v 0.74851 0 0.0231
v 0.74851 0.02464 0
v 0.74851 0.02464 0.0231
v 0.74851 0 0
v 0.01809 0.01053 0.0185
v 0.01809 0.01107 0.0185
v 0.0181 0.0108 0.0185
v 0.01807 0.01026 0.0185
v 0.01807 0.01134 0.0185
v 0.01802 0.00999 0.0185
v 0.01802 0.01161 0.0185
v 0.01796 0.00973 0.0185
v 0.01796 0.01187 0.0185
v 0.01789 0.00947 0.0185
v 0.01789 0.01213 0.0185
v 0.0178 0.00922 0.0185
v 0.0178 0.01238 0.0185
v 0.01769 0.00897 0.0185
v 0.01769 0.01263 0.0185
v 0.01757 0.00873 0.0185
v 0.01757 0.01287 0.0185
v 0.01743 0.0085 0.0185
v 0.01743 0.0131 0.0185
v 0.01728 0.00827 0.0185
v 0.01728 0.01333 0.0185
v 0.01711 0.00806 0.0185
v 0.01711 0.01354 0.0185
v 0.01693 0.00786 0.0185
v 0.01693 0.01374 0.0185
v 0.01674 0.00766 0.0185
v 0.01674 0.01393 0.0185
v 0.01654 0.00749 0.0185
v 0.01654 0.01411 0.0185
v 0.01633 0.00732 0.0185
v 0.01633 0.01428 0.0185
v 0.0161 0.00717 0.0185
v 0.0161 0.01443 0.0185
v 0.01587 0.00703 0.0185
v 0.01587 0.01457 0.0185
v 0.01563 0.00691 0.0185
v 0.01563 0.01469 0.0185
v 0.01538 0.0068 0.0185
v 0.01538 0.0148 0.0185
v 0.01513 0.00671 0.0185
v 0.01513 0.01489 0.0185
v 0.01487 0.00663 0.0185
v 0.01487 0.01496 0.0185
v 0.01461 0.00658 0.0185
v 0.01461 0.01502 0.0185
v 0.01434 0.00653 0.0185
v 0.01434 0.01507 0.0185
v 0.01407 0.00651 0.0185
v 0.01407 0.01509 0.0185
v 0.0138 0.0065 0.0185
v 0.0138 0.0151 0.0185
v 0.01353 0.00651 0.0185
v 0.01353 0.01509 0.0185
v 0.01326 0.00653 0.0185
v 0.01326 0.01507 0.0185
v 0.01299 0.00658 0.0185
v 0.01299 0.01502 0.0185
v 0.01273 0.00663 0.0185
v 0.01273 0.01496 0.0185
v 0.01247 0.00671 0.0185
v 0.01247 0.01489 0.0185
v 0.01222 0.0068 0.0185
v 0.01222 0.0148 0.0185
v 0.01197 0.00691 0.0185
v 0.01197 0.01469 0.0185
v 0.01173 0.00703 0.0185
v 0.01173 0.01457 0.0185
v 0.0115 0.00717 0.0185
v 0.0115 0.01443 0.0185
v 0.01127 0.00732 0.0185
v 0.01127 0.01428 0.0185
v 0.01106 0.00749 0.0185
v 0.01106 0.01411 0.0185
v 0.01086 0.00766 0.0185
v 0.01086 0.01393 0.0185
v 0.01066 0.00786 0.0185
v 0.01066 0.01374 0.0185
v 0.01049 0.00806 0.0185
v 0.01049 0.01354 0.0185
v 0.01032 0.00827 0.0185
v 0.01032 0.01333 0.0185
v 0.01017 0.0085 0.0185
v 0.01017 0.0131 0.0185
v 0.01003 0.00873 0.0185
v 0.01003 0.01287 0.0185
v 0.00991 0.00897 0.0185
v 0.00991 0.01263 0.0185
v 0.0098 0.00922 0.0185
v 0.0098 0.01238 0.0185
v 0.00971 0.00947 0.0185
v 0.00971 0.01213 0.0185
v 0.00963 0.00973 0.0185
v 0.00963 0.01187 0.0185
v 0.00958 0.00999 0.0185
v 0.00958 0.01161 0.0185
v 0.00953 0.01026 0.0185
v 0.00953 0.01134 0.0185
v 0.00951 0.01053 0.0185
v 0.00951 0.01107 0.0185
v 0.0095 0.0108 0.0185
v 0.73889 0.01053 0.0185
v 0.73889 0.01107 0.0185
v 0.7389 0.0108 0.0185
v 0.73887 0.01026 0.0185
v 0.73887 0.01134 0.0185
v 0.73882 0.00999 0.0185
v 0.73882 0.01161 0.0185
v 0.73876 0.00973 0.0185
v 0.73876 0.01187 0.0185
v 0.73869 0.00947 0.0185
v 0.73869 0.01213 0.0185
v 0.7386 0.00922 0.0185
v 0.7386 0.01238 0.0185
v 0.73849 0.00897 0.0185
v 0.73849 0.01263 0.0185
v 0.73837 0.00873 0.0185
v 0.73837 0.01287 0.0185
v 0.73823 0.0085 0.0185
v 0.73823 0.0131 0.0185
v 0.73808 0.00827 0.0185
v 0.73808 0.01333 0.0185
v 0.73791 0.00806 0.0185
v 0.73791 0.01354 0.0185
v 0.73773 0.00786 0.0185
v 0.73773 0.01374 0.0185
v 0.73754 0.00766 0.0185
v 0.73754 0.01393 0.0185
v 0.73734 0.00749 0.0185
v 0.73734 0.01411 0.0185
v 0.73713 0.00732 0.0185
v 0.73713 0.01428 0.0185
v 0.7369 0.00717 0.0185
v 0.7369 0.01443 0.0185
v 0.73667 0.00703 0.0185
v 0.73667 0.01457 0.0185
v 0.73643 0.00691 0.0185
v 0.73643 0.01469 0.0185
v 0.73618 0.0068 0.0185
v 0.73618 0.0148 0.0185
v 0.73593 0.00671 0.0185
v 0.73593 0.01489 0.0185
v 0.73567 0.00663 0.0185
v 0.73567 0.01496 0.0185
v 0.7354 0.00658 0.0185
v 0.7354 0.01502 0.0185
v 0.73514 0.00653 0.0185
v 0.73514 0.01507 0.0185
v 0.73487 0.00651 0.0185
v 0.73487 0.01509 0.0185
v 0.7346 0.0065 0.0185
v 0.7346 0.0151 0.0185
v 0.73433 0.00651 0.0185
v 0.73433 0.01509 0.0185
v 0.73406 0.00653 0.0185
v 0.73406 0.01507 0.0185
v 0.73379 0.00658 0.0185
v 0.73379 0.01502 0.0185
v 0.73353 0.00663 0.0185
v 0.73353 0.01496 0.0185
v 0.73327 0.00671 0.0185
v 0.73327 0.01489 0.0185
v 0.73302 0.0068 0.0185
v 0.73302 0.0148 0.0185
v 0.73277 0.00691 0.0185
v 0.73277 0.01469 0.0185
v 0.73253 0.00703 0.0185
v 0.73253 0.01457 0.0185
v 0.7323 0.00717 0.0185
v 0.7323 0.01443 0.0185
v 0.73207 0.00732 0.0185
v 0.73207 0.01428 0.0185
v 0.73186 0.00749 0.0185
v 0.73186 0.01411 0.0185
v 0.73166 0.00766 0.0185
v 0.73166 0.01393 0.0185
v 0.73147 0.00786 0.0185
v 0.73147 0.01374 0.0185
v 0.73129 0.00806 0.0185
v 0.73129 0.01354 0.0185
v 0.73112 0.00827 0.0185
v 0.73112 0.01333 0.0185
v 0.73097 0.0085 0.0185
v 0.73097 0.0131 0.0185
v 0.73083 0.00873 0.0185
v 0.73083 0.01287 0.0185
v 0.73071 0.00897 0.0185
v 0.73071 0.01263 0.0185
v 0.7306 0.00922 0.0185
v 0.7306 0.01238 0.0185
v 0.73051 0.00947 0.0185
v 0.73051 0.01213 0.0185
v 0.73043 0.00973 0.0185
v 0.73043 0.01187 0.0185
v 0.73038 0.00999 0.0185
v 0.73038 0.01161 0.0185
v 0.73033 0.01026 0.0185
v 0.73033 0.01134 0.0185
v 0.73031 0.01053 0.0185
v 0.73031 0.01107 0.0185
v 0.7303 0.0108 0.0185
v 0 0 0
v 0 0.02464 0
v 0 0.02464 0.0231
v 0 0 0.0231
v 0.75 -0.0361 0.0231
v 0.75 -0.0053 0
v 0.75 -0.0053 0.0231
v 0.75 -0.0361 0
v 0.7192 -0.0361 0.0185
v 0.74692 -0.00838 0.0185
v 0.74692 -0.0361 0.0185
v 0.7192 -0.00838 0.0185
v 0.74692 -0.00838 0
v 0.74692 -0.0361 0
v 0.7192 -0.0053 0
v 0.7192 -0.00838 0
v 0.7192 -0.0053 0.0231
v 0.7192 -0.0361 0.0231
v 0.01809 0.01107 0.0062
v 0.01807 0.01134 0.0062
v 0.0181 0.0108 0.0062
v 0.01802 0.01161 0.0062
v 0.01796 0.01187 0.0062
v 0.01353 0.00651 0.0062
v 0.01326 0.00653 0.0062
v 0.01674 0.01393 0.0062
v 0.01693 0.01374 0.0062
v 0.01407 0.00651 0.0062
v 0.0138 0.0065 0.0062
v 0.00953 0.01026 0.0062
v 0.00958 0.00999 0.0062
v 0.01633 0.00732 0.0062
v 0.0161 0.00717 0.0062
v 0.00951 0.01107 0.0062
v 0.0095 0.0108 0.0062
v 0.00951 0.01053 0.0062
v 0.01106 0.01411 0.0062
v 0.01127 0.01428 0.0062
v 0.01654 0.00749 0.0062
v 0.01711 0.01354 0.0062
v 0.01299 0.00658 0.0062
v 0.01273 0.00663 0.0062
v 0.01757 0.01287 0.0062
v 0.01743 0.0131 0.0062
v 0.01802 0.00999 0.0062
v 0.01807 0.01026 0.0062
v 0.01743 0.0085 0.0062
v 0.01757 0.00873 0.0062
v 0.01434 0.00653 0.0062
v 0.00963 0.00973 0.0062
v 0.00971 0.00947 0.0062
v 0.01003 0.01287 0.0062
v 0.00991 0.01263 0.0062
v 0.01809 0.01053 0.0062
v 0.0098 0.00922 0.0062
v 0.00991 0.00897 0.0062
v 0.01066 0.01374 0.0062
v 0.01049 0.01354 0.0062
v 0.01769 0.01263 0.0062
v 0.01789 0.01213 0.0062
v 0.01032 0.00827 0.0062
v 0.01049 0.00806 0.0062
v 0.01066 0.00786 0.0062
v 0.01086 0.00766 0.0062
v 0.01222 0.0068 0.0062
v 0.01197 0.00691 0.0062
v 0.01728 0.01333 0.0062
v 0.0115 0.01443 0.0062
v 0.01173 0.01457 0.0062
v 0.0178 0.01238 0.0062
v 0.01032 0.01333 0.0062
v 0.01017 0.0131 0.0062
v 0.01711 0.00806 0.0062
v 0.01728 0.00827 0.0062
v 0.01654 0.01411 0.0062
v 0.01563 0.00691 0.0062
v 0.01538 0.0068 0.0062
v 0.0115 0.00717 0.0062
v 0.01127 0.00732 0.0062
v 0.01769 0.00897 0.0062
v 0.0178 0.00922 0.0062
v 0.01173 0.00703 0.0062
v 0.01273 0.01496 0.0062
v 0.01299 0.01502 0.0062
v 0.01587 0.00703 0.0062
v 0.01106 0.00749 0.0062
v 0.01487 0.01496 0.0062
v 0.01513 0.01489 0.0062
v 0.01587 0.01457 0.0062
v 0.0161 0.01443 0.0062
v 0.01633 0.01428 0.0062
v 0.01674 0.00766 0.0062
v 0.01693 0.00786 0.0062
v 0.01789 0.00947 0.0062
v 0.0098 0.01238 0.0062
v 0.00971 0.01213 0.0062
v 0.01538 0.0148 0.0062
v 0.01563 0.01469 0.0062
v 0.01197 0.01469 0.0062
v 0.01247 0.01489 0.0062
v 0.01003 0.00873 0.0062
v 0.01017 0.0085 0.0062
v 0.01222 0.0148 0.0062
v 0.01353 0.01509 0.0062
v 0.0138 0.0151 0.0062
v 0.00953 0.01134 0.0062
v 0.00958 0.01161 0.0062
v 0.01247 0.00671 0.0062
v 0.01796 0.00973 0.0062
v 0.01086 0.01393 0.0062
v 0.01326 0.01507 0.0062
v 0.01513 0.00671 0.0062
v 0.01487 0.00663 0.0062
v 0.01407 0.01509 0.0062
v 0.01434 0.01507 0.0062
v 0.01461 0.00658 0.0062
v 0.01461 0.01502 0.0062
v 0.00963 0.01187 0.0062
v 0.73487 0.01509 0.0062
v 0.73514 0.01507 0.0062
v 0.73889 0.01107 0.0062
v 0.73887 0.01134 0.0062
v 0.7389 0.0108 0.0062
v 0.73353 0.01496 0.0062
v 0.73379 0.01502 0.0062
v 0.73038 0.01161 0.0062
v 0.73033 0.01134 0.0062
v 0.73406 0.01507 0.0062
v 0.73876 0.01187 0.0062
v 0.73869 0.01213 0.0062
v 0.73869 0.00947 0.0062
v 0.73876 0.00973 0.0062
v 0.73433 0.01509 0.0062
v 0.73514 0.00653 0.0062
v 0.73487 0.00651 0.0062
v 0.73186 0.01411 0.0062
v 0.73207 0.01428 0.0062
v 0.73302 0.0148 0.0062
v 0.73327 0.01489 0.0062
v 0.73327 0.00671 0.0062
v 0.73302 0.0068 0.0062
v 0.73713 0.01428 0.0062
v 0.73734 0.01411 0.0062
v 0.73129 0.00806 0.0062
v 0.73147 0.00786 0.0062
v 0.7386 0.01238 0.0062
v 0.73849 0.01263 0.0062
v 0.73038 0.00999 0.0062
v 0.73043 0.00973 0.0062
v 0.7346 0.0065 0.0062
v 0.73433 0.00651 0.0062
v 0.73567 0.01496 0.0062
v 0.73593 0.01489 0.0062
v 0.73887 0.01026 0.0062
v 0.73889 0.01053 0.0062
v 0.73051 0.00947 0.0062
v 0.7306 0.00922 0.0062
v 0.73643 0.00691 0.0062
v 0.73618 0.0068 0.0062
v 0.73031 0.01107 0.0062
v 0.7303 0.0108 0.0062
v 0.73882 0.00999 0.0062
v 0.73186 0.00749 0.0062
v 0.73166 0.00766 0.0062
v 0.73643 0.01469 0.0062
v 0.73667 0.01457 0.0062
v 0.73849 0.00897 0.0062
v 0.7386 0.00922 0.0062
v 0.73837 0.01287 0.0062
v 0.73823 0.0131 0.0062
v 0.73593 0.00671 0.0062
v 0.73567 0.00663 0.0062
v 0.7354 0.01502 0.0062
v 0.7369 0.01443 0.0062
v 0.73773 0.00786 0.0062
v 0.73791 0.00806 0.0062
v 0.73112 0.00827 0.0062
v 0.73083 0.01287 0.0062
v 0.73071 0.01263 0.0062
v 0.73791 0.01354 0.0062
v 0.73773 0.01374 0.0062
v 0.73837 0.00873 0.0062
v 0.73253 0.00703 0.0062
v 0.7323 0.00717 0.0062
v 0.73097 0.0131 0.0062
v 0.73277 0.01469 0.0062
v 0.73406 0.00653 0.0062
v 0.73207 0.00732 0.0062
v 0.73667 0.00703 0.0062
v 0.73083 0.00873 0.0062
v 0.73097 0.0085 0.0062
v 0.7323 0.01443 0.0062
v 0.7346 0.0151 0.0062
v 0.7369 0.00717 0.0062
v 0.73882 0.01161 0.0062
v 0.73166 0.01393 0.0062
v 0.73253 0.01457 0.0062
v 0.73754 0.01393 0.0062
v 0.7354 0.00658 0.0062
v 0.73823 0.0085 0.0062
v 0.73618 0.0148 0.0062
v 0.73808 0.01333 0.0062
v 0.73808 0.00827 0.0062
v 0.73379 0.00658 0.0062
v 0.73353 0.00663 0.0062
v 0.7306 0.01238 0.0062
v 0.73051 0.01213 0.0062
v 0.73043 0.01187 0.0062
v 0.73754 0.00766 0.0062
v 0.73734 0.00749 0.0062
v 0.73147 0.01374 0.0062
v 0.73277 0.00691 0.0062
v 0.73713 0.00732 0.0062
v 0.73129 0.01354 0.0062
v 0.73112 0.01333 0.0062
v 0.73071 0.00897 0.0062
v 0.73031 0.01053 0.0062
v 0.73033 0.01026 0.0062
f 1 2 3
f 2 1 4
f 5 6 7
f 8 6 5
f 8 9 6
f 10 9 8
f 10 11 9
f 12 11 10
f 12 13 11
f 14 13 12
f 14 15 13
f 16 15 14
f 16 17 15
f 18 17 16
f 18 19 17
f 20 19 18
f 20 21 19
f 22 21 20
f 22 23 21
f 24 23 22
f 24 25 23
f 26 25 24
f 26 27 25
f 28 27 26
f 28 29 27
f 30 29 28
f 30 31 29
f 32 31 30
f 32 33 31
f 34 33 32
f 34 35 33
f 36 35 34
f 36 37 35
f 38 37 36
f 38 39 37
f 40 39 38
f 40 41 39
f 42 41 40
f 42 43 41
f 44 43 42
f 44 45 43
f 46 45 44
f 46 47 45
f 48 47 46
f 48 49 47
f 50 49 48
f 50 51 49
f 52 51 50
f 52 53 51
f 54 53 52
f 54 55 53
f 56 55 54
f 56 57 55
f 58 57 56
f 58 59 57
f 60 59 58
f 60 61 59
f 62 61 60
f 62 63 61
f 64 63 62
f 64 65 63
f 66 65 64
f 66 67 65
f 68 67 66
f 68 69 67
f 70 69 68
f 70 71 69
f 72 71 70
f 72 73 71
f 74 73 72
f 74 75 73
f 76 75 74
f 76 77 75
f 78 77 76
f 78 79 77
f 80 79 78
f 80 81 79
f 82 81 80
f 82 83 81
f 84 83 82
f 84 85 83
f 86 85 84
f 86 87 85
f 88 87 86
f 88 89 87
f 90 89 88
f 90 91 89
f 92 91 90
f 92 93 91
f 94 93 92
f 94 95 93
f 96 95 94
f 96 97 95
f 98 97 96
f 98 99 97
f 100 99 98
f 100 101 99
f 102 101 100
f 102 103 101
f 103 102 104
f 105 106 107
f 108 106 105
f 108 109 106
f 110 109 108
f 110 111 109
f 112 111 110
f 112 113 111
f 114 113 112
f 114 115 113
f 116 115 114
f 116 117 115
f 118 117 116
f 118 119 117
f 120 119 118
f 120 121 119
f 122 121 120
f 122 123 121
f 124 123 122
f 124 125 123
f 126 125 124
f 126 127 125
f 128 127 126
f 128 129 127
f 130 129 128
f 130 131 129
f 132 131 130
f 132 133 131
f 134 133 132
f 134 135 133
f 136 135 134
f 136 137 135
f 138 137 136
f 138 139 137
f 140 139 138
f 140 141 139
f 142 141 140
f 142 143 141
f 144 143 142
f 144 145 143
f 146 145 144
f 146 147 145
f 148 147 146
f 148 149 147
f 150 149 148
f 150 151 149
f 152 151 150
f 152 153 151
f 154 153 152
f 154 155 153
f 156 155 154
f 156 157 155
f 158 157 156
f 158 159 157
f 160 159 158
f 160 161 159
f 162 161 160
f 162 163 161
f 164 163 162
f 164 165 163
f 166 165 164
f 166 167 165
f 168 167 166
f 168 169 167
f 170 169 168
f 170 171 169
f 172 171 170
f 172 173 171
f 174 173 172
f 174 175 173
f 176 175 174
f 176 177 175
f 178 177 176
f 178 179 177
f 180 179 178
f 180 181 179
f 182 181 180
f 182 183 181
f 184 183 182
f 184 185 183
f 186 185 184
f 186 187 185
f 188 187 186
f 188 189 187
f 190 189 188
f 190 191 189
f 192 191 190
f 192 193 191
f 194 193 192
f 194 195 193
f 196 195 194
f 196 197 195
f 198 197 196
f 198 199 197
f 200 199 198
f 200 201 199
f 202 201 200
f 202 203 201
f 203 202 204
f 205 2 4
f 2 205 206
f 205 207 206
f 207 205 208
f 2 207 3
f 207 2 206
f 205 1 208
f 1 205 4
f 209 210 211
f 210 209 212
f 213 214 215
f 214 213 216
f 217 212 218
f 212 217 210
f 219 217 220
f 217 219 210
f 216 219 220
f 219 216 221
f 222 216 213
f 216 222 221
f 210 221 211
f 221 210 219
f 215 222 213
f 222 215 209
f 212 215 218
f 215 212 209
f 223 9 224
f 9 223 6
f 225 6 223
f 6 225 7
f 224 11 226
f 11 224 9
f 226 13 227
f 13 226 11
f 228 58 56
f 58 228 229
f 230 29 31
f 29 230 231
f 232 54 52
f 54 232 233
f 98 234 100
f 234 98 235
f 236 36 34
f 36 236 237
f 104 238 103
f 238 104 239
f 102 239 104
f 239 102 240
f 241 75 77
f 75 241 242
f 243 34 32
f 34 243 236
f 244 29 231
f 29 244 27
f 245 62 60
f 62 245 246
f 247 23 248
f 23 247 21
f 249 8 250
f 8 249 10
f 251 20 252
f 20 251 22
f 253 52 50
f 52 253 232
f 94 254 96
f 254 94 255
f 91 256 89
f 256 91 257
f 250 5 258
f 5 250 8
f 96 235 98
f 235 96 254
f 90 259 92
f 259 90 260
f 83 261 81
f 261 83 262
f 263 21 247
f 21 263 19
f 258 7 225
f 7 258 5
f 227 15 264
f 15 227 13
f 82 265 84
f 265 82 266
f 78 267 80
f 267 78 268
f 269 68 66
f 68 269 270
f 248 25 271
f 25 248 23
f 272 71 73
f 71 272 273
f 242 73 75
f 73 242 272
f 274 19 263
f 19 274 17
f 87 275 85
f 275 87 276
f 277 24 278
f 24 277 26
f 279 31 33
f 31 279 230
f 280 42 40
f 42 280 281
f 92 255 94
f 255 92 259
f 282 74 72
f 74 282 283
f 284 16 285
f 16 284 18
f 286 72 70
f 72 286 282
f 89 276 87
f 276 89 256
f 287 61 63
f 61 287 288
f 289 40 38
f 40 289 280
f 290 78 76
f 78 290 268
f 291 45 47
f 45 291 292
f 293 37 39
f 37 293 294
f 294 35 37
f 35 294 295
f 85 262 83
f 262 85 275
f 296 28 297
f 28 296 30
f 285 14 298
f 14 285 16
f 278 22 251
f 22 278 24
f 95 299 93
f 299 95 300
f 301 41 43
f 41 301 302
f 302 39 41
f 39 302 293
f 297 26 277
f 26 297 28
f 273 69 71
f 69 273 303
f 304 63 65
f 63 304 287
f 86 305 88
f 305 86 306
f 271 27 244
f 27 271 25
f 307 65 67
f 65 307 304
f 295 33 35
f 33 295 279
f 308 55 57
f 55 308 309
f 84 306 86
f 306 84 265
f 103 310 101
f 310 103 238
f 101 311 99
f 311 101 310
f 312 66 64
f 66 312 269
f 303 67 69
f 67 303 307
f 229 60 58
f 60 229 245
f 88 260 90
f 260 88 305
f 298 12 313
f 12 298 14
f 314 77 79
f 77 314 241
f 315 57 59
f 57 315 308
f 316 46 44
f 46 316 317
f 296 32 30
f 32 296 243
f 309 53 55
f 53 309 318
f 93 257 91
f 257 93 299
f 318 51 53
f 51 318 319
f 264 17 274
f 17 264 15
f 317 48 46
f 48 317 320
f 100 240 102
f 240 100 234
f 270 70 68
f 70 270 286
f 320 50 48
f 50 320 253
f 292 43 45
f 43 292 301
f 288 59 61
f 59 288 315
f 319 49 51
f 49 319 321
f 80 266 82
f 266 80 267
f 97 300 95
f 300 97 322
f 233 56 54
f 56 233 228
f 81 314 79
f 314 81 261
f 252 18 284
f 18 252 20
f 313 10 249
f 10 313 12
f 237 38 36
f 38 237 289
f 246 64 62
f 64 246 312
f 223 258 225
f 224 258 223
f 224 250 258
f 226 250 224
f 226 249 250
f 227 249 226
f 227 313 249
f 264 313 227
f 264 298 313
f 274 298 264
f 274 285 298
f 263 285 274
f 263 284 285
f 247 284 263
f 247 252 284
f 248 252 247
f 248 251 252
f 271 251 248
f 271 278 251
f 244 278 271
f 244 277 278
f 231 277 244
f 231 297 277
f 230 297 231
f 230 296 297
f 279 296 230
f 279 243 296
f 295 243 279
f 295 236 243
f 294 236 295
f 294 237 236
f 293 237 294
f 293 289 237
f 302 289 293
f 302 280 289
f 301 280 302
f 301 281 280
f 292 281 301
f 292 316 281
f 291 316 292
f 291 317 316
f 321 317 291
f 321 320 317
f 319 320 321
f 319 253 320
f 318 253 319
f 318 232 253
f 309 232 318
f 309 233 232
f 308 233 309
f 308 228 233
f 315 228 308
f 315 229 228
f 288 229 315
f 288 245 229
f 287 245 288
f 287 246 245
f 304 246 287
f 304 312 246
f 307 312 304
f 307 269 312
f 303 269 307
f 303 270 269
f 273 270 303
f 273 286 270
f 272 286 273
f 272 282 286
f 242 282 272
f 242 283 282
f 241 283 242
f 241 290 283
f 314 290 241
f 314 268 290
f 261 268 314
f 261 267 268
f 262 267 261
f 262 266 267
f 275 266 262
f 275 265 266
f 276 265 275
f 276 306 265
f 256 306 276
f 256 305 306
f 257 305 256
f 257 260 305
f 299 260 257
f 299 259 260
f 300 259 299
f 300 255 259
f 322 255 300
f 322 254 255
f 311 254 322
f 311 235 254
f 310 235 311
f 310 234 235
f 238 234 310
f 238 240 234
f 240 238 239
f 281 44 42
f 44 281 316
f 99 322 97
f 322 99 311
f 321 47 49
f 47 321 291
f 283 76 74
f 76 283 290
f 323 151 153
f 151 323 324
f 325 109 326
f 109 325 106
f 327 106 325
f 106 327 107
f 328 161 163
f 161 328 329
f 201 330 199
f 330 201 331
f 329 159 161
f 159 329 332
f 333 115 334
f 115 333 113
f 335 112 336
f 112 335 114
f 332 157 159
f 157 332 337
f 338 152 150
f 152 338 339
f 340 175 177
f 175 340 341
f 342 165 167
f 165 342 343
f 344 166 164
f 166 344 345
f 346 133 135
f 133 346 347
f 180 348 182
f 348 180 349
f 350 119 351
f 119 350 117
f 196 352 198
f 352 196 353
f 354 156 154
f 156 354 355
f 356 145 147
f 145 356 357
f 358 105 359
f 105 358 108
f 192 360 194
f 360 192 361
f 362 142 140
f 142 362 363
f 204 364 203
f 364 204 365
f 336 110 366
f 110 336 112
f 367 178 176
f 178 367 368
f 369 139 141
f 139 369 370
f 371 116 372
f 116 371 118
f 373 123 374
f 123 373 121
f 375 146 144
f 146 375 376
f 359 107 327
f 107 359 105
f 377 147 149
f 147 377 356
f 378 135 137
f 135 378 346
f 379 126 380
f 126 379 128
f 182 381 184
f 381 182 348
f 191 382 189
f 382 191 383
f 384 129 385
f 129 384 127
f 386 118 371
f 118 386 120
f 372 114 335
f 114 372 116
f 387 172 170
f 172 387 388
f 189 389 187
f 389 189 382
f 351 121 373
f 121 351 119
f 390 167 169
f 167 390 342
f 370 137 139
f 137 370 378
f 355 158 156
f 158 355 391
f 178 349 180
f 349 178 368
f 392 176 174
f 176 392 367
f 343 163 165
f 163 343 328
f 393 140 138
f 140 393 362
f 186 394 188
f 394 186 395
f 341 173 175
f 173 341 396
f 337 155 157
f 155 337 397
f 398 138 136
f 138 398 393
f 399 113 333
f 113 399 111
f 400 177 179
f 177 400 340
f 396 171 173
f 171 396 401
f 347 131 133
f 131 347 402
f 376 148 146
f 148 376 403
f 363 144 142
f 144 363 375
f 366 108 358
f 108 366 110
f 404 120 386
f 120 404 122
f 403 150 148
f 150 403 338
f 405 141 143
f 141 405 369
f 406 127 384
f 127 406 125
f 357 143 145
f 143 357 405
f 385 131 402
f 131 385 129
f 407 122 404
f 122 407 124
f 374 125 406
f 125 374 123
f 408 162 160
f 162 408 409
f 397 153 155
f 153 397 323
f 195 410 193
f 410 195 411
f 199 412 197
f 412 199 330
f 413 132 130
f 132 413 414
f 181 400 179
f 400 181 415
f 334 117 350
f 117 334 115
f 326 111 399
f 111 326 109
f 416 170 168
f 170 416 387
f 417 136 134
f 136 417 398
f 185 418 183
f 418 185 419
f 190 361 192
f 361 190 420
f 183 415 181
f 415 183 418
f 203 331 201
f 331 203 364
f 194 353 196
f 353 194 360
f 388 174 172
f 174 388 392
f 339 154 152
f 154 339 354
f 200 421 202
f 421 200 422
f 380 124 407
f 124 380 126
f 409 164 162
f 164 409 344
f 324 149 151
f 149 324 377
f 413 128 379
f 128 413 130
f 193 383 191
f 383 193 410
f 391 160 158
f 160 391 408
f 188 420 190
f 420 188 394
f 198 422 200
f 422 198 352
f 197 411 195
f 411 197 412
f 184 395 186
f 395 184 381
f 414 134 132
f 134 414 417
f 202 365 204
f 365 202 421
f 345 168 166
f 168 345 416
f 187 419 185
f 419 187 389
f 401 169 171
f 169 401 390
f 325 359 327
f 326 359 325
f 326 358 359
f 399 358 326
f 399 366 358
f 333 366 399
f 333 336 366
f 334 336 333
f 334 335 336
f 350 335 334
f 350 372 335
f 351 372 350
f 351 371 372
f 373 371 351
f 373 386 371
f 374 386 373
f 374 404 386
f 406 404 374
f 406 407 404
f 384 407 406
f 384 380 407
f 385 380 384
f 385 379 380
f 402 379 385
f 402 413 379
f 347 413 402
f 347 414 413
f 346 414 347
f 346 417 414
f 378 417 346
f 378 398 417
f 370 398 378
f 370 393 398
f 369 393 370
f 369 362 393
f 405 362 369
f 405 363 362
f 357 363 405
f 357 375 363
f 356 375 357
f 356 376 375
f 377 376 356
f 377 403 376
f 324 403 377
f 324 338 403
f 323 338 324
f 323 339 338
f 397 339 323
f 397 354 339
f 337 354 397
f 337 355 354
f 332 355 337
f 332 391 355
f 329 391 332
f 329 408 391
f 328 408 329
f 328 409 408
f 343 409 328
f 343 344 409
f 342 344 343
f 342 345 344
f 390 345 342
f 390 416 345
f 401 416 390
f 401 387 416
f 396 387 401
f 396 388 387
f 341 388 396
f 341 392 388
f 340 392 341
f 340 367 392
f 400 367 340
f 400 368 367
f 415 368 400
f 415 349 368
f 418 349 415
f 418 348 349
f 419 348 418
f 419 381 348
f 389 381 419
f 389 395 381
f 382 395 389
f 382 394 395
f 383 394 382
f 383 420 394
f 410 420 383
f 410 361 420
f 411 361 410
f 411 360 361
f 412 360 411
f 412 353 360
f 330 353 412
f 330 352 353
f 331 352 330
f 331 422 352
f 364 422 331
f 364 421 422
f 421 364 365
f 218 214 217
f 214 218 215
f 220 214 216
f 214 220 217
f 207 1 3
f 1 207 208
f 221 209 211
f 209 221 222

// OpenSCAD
// Parametric CAD Model
// All dimensions are in millimeters (or the consistent base unit of the model)

$fn = 100; // High resolution for smooth circular cuts

// --- Parameters ---

// Z-axis Datums and Heights
z_base = 0.0;
z_lower_top = 0.0185; // Extrusion depth of lower solid body
z_upper_top = 0.0231; // Upper surface Z level
layer_top_thickness = 0.0046; // Extrusion depth of the top layer (0.0231 - 0.0185)

// Rail Dimensions
rail_length = 0.748506;
rail_width = 0.024642;

// End Block Dimensions & Position
block_size = 0.030803;
block_x = 0.7192; // Left edge from rail left end
block_y = -0.0361; // Front edge in front of rail front edge (Y=0)

// Rail Circular Recesses
rail_recess_radius = 0.0043;
rail_recess_y = 0.0108; // Offset from rail front edge
rail_recess_x1 = 0.0138;
rail_recess_x2 = 0.7346;
recess_z_min = 0.0062;
recess_z_max = z_lower_top;
recess_depth = recess_z_max - recess_z_min; // 0.0123

// End Block Circular Recess
block_recess_x = 0.7361;
block_recess_y = -0.0192; // In front of rail front edge

// End Block Cutout
cutout_size = 0.027722;
cutout_z_min = -0.0585; // 0.0585 below the base underside
cutout_z_max = z_lower_top; // 0.0185 above the base underside

// --- Main Model ---

union() {
    // 1. Shallow Top Layers (Z = 0.0185 to 0.0231)
    // Added outside the difference block to preserve them from the cuts in the lower body
    
    // Rail top layer
    translate([0, 0, z_lower_top])
        cube([rail_length, rail_width, layer_top_thickness]);
        
    // End block top layer
    translate([block_x, block_y, z_lower_top])
        cube([block_size, block_size, layer_top_thickness]);

    // 2. Lower Bodies with Subtractive Features (Z = 0 to 0.0185)
    difference() {
        // Base solid bodies
        union() {
            // Main rail lower body
            cube([rail_length, rail_width, z_lower_top]);
            
            // End block lower body
            translate([block_x, block_y, z_base])
                cube([block_size, block_size, z_lower_top]);
        }
        
        // Subtractive Features (Cuts)
        
        // A. Rail Circular Recesses
        // Extended slightly in +Z to cleanly cut the top surface of the lower body
        translate([rail_recess_x1, rail_recess_y, recess_z_min])
            cylinder(h=recess_depth + 0.001, r=rail_recess_radius);
            
        translate([rail_recess_x2, rail_recess_y, recess_z_min])
            cylinder(h=recess_depth + 0.001, r=rail_recess_radius);
            
        // B. End Block Circular Recess
        translate([block_recess_x, block_recess_y, recess_z_min])
            cylinder(h=recess_depth + 0.001, r=rail_recess_radius);
            
        // C. End Block Deep Cutout
        // Shares the left (X) and front (Y) edges of the end block.
        // Extends slightly in -X, -Y, and +Z to avoid coincident faces during boolean difference.
        translate([block_x - 0.001, block_y - 0.001, cutout_z_min])
            cube([cutout_size + 0.001, cutout_size + 0.001, cutout_z_max - cutout_z_min + 0.001]);
    }
}
